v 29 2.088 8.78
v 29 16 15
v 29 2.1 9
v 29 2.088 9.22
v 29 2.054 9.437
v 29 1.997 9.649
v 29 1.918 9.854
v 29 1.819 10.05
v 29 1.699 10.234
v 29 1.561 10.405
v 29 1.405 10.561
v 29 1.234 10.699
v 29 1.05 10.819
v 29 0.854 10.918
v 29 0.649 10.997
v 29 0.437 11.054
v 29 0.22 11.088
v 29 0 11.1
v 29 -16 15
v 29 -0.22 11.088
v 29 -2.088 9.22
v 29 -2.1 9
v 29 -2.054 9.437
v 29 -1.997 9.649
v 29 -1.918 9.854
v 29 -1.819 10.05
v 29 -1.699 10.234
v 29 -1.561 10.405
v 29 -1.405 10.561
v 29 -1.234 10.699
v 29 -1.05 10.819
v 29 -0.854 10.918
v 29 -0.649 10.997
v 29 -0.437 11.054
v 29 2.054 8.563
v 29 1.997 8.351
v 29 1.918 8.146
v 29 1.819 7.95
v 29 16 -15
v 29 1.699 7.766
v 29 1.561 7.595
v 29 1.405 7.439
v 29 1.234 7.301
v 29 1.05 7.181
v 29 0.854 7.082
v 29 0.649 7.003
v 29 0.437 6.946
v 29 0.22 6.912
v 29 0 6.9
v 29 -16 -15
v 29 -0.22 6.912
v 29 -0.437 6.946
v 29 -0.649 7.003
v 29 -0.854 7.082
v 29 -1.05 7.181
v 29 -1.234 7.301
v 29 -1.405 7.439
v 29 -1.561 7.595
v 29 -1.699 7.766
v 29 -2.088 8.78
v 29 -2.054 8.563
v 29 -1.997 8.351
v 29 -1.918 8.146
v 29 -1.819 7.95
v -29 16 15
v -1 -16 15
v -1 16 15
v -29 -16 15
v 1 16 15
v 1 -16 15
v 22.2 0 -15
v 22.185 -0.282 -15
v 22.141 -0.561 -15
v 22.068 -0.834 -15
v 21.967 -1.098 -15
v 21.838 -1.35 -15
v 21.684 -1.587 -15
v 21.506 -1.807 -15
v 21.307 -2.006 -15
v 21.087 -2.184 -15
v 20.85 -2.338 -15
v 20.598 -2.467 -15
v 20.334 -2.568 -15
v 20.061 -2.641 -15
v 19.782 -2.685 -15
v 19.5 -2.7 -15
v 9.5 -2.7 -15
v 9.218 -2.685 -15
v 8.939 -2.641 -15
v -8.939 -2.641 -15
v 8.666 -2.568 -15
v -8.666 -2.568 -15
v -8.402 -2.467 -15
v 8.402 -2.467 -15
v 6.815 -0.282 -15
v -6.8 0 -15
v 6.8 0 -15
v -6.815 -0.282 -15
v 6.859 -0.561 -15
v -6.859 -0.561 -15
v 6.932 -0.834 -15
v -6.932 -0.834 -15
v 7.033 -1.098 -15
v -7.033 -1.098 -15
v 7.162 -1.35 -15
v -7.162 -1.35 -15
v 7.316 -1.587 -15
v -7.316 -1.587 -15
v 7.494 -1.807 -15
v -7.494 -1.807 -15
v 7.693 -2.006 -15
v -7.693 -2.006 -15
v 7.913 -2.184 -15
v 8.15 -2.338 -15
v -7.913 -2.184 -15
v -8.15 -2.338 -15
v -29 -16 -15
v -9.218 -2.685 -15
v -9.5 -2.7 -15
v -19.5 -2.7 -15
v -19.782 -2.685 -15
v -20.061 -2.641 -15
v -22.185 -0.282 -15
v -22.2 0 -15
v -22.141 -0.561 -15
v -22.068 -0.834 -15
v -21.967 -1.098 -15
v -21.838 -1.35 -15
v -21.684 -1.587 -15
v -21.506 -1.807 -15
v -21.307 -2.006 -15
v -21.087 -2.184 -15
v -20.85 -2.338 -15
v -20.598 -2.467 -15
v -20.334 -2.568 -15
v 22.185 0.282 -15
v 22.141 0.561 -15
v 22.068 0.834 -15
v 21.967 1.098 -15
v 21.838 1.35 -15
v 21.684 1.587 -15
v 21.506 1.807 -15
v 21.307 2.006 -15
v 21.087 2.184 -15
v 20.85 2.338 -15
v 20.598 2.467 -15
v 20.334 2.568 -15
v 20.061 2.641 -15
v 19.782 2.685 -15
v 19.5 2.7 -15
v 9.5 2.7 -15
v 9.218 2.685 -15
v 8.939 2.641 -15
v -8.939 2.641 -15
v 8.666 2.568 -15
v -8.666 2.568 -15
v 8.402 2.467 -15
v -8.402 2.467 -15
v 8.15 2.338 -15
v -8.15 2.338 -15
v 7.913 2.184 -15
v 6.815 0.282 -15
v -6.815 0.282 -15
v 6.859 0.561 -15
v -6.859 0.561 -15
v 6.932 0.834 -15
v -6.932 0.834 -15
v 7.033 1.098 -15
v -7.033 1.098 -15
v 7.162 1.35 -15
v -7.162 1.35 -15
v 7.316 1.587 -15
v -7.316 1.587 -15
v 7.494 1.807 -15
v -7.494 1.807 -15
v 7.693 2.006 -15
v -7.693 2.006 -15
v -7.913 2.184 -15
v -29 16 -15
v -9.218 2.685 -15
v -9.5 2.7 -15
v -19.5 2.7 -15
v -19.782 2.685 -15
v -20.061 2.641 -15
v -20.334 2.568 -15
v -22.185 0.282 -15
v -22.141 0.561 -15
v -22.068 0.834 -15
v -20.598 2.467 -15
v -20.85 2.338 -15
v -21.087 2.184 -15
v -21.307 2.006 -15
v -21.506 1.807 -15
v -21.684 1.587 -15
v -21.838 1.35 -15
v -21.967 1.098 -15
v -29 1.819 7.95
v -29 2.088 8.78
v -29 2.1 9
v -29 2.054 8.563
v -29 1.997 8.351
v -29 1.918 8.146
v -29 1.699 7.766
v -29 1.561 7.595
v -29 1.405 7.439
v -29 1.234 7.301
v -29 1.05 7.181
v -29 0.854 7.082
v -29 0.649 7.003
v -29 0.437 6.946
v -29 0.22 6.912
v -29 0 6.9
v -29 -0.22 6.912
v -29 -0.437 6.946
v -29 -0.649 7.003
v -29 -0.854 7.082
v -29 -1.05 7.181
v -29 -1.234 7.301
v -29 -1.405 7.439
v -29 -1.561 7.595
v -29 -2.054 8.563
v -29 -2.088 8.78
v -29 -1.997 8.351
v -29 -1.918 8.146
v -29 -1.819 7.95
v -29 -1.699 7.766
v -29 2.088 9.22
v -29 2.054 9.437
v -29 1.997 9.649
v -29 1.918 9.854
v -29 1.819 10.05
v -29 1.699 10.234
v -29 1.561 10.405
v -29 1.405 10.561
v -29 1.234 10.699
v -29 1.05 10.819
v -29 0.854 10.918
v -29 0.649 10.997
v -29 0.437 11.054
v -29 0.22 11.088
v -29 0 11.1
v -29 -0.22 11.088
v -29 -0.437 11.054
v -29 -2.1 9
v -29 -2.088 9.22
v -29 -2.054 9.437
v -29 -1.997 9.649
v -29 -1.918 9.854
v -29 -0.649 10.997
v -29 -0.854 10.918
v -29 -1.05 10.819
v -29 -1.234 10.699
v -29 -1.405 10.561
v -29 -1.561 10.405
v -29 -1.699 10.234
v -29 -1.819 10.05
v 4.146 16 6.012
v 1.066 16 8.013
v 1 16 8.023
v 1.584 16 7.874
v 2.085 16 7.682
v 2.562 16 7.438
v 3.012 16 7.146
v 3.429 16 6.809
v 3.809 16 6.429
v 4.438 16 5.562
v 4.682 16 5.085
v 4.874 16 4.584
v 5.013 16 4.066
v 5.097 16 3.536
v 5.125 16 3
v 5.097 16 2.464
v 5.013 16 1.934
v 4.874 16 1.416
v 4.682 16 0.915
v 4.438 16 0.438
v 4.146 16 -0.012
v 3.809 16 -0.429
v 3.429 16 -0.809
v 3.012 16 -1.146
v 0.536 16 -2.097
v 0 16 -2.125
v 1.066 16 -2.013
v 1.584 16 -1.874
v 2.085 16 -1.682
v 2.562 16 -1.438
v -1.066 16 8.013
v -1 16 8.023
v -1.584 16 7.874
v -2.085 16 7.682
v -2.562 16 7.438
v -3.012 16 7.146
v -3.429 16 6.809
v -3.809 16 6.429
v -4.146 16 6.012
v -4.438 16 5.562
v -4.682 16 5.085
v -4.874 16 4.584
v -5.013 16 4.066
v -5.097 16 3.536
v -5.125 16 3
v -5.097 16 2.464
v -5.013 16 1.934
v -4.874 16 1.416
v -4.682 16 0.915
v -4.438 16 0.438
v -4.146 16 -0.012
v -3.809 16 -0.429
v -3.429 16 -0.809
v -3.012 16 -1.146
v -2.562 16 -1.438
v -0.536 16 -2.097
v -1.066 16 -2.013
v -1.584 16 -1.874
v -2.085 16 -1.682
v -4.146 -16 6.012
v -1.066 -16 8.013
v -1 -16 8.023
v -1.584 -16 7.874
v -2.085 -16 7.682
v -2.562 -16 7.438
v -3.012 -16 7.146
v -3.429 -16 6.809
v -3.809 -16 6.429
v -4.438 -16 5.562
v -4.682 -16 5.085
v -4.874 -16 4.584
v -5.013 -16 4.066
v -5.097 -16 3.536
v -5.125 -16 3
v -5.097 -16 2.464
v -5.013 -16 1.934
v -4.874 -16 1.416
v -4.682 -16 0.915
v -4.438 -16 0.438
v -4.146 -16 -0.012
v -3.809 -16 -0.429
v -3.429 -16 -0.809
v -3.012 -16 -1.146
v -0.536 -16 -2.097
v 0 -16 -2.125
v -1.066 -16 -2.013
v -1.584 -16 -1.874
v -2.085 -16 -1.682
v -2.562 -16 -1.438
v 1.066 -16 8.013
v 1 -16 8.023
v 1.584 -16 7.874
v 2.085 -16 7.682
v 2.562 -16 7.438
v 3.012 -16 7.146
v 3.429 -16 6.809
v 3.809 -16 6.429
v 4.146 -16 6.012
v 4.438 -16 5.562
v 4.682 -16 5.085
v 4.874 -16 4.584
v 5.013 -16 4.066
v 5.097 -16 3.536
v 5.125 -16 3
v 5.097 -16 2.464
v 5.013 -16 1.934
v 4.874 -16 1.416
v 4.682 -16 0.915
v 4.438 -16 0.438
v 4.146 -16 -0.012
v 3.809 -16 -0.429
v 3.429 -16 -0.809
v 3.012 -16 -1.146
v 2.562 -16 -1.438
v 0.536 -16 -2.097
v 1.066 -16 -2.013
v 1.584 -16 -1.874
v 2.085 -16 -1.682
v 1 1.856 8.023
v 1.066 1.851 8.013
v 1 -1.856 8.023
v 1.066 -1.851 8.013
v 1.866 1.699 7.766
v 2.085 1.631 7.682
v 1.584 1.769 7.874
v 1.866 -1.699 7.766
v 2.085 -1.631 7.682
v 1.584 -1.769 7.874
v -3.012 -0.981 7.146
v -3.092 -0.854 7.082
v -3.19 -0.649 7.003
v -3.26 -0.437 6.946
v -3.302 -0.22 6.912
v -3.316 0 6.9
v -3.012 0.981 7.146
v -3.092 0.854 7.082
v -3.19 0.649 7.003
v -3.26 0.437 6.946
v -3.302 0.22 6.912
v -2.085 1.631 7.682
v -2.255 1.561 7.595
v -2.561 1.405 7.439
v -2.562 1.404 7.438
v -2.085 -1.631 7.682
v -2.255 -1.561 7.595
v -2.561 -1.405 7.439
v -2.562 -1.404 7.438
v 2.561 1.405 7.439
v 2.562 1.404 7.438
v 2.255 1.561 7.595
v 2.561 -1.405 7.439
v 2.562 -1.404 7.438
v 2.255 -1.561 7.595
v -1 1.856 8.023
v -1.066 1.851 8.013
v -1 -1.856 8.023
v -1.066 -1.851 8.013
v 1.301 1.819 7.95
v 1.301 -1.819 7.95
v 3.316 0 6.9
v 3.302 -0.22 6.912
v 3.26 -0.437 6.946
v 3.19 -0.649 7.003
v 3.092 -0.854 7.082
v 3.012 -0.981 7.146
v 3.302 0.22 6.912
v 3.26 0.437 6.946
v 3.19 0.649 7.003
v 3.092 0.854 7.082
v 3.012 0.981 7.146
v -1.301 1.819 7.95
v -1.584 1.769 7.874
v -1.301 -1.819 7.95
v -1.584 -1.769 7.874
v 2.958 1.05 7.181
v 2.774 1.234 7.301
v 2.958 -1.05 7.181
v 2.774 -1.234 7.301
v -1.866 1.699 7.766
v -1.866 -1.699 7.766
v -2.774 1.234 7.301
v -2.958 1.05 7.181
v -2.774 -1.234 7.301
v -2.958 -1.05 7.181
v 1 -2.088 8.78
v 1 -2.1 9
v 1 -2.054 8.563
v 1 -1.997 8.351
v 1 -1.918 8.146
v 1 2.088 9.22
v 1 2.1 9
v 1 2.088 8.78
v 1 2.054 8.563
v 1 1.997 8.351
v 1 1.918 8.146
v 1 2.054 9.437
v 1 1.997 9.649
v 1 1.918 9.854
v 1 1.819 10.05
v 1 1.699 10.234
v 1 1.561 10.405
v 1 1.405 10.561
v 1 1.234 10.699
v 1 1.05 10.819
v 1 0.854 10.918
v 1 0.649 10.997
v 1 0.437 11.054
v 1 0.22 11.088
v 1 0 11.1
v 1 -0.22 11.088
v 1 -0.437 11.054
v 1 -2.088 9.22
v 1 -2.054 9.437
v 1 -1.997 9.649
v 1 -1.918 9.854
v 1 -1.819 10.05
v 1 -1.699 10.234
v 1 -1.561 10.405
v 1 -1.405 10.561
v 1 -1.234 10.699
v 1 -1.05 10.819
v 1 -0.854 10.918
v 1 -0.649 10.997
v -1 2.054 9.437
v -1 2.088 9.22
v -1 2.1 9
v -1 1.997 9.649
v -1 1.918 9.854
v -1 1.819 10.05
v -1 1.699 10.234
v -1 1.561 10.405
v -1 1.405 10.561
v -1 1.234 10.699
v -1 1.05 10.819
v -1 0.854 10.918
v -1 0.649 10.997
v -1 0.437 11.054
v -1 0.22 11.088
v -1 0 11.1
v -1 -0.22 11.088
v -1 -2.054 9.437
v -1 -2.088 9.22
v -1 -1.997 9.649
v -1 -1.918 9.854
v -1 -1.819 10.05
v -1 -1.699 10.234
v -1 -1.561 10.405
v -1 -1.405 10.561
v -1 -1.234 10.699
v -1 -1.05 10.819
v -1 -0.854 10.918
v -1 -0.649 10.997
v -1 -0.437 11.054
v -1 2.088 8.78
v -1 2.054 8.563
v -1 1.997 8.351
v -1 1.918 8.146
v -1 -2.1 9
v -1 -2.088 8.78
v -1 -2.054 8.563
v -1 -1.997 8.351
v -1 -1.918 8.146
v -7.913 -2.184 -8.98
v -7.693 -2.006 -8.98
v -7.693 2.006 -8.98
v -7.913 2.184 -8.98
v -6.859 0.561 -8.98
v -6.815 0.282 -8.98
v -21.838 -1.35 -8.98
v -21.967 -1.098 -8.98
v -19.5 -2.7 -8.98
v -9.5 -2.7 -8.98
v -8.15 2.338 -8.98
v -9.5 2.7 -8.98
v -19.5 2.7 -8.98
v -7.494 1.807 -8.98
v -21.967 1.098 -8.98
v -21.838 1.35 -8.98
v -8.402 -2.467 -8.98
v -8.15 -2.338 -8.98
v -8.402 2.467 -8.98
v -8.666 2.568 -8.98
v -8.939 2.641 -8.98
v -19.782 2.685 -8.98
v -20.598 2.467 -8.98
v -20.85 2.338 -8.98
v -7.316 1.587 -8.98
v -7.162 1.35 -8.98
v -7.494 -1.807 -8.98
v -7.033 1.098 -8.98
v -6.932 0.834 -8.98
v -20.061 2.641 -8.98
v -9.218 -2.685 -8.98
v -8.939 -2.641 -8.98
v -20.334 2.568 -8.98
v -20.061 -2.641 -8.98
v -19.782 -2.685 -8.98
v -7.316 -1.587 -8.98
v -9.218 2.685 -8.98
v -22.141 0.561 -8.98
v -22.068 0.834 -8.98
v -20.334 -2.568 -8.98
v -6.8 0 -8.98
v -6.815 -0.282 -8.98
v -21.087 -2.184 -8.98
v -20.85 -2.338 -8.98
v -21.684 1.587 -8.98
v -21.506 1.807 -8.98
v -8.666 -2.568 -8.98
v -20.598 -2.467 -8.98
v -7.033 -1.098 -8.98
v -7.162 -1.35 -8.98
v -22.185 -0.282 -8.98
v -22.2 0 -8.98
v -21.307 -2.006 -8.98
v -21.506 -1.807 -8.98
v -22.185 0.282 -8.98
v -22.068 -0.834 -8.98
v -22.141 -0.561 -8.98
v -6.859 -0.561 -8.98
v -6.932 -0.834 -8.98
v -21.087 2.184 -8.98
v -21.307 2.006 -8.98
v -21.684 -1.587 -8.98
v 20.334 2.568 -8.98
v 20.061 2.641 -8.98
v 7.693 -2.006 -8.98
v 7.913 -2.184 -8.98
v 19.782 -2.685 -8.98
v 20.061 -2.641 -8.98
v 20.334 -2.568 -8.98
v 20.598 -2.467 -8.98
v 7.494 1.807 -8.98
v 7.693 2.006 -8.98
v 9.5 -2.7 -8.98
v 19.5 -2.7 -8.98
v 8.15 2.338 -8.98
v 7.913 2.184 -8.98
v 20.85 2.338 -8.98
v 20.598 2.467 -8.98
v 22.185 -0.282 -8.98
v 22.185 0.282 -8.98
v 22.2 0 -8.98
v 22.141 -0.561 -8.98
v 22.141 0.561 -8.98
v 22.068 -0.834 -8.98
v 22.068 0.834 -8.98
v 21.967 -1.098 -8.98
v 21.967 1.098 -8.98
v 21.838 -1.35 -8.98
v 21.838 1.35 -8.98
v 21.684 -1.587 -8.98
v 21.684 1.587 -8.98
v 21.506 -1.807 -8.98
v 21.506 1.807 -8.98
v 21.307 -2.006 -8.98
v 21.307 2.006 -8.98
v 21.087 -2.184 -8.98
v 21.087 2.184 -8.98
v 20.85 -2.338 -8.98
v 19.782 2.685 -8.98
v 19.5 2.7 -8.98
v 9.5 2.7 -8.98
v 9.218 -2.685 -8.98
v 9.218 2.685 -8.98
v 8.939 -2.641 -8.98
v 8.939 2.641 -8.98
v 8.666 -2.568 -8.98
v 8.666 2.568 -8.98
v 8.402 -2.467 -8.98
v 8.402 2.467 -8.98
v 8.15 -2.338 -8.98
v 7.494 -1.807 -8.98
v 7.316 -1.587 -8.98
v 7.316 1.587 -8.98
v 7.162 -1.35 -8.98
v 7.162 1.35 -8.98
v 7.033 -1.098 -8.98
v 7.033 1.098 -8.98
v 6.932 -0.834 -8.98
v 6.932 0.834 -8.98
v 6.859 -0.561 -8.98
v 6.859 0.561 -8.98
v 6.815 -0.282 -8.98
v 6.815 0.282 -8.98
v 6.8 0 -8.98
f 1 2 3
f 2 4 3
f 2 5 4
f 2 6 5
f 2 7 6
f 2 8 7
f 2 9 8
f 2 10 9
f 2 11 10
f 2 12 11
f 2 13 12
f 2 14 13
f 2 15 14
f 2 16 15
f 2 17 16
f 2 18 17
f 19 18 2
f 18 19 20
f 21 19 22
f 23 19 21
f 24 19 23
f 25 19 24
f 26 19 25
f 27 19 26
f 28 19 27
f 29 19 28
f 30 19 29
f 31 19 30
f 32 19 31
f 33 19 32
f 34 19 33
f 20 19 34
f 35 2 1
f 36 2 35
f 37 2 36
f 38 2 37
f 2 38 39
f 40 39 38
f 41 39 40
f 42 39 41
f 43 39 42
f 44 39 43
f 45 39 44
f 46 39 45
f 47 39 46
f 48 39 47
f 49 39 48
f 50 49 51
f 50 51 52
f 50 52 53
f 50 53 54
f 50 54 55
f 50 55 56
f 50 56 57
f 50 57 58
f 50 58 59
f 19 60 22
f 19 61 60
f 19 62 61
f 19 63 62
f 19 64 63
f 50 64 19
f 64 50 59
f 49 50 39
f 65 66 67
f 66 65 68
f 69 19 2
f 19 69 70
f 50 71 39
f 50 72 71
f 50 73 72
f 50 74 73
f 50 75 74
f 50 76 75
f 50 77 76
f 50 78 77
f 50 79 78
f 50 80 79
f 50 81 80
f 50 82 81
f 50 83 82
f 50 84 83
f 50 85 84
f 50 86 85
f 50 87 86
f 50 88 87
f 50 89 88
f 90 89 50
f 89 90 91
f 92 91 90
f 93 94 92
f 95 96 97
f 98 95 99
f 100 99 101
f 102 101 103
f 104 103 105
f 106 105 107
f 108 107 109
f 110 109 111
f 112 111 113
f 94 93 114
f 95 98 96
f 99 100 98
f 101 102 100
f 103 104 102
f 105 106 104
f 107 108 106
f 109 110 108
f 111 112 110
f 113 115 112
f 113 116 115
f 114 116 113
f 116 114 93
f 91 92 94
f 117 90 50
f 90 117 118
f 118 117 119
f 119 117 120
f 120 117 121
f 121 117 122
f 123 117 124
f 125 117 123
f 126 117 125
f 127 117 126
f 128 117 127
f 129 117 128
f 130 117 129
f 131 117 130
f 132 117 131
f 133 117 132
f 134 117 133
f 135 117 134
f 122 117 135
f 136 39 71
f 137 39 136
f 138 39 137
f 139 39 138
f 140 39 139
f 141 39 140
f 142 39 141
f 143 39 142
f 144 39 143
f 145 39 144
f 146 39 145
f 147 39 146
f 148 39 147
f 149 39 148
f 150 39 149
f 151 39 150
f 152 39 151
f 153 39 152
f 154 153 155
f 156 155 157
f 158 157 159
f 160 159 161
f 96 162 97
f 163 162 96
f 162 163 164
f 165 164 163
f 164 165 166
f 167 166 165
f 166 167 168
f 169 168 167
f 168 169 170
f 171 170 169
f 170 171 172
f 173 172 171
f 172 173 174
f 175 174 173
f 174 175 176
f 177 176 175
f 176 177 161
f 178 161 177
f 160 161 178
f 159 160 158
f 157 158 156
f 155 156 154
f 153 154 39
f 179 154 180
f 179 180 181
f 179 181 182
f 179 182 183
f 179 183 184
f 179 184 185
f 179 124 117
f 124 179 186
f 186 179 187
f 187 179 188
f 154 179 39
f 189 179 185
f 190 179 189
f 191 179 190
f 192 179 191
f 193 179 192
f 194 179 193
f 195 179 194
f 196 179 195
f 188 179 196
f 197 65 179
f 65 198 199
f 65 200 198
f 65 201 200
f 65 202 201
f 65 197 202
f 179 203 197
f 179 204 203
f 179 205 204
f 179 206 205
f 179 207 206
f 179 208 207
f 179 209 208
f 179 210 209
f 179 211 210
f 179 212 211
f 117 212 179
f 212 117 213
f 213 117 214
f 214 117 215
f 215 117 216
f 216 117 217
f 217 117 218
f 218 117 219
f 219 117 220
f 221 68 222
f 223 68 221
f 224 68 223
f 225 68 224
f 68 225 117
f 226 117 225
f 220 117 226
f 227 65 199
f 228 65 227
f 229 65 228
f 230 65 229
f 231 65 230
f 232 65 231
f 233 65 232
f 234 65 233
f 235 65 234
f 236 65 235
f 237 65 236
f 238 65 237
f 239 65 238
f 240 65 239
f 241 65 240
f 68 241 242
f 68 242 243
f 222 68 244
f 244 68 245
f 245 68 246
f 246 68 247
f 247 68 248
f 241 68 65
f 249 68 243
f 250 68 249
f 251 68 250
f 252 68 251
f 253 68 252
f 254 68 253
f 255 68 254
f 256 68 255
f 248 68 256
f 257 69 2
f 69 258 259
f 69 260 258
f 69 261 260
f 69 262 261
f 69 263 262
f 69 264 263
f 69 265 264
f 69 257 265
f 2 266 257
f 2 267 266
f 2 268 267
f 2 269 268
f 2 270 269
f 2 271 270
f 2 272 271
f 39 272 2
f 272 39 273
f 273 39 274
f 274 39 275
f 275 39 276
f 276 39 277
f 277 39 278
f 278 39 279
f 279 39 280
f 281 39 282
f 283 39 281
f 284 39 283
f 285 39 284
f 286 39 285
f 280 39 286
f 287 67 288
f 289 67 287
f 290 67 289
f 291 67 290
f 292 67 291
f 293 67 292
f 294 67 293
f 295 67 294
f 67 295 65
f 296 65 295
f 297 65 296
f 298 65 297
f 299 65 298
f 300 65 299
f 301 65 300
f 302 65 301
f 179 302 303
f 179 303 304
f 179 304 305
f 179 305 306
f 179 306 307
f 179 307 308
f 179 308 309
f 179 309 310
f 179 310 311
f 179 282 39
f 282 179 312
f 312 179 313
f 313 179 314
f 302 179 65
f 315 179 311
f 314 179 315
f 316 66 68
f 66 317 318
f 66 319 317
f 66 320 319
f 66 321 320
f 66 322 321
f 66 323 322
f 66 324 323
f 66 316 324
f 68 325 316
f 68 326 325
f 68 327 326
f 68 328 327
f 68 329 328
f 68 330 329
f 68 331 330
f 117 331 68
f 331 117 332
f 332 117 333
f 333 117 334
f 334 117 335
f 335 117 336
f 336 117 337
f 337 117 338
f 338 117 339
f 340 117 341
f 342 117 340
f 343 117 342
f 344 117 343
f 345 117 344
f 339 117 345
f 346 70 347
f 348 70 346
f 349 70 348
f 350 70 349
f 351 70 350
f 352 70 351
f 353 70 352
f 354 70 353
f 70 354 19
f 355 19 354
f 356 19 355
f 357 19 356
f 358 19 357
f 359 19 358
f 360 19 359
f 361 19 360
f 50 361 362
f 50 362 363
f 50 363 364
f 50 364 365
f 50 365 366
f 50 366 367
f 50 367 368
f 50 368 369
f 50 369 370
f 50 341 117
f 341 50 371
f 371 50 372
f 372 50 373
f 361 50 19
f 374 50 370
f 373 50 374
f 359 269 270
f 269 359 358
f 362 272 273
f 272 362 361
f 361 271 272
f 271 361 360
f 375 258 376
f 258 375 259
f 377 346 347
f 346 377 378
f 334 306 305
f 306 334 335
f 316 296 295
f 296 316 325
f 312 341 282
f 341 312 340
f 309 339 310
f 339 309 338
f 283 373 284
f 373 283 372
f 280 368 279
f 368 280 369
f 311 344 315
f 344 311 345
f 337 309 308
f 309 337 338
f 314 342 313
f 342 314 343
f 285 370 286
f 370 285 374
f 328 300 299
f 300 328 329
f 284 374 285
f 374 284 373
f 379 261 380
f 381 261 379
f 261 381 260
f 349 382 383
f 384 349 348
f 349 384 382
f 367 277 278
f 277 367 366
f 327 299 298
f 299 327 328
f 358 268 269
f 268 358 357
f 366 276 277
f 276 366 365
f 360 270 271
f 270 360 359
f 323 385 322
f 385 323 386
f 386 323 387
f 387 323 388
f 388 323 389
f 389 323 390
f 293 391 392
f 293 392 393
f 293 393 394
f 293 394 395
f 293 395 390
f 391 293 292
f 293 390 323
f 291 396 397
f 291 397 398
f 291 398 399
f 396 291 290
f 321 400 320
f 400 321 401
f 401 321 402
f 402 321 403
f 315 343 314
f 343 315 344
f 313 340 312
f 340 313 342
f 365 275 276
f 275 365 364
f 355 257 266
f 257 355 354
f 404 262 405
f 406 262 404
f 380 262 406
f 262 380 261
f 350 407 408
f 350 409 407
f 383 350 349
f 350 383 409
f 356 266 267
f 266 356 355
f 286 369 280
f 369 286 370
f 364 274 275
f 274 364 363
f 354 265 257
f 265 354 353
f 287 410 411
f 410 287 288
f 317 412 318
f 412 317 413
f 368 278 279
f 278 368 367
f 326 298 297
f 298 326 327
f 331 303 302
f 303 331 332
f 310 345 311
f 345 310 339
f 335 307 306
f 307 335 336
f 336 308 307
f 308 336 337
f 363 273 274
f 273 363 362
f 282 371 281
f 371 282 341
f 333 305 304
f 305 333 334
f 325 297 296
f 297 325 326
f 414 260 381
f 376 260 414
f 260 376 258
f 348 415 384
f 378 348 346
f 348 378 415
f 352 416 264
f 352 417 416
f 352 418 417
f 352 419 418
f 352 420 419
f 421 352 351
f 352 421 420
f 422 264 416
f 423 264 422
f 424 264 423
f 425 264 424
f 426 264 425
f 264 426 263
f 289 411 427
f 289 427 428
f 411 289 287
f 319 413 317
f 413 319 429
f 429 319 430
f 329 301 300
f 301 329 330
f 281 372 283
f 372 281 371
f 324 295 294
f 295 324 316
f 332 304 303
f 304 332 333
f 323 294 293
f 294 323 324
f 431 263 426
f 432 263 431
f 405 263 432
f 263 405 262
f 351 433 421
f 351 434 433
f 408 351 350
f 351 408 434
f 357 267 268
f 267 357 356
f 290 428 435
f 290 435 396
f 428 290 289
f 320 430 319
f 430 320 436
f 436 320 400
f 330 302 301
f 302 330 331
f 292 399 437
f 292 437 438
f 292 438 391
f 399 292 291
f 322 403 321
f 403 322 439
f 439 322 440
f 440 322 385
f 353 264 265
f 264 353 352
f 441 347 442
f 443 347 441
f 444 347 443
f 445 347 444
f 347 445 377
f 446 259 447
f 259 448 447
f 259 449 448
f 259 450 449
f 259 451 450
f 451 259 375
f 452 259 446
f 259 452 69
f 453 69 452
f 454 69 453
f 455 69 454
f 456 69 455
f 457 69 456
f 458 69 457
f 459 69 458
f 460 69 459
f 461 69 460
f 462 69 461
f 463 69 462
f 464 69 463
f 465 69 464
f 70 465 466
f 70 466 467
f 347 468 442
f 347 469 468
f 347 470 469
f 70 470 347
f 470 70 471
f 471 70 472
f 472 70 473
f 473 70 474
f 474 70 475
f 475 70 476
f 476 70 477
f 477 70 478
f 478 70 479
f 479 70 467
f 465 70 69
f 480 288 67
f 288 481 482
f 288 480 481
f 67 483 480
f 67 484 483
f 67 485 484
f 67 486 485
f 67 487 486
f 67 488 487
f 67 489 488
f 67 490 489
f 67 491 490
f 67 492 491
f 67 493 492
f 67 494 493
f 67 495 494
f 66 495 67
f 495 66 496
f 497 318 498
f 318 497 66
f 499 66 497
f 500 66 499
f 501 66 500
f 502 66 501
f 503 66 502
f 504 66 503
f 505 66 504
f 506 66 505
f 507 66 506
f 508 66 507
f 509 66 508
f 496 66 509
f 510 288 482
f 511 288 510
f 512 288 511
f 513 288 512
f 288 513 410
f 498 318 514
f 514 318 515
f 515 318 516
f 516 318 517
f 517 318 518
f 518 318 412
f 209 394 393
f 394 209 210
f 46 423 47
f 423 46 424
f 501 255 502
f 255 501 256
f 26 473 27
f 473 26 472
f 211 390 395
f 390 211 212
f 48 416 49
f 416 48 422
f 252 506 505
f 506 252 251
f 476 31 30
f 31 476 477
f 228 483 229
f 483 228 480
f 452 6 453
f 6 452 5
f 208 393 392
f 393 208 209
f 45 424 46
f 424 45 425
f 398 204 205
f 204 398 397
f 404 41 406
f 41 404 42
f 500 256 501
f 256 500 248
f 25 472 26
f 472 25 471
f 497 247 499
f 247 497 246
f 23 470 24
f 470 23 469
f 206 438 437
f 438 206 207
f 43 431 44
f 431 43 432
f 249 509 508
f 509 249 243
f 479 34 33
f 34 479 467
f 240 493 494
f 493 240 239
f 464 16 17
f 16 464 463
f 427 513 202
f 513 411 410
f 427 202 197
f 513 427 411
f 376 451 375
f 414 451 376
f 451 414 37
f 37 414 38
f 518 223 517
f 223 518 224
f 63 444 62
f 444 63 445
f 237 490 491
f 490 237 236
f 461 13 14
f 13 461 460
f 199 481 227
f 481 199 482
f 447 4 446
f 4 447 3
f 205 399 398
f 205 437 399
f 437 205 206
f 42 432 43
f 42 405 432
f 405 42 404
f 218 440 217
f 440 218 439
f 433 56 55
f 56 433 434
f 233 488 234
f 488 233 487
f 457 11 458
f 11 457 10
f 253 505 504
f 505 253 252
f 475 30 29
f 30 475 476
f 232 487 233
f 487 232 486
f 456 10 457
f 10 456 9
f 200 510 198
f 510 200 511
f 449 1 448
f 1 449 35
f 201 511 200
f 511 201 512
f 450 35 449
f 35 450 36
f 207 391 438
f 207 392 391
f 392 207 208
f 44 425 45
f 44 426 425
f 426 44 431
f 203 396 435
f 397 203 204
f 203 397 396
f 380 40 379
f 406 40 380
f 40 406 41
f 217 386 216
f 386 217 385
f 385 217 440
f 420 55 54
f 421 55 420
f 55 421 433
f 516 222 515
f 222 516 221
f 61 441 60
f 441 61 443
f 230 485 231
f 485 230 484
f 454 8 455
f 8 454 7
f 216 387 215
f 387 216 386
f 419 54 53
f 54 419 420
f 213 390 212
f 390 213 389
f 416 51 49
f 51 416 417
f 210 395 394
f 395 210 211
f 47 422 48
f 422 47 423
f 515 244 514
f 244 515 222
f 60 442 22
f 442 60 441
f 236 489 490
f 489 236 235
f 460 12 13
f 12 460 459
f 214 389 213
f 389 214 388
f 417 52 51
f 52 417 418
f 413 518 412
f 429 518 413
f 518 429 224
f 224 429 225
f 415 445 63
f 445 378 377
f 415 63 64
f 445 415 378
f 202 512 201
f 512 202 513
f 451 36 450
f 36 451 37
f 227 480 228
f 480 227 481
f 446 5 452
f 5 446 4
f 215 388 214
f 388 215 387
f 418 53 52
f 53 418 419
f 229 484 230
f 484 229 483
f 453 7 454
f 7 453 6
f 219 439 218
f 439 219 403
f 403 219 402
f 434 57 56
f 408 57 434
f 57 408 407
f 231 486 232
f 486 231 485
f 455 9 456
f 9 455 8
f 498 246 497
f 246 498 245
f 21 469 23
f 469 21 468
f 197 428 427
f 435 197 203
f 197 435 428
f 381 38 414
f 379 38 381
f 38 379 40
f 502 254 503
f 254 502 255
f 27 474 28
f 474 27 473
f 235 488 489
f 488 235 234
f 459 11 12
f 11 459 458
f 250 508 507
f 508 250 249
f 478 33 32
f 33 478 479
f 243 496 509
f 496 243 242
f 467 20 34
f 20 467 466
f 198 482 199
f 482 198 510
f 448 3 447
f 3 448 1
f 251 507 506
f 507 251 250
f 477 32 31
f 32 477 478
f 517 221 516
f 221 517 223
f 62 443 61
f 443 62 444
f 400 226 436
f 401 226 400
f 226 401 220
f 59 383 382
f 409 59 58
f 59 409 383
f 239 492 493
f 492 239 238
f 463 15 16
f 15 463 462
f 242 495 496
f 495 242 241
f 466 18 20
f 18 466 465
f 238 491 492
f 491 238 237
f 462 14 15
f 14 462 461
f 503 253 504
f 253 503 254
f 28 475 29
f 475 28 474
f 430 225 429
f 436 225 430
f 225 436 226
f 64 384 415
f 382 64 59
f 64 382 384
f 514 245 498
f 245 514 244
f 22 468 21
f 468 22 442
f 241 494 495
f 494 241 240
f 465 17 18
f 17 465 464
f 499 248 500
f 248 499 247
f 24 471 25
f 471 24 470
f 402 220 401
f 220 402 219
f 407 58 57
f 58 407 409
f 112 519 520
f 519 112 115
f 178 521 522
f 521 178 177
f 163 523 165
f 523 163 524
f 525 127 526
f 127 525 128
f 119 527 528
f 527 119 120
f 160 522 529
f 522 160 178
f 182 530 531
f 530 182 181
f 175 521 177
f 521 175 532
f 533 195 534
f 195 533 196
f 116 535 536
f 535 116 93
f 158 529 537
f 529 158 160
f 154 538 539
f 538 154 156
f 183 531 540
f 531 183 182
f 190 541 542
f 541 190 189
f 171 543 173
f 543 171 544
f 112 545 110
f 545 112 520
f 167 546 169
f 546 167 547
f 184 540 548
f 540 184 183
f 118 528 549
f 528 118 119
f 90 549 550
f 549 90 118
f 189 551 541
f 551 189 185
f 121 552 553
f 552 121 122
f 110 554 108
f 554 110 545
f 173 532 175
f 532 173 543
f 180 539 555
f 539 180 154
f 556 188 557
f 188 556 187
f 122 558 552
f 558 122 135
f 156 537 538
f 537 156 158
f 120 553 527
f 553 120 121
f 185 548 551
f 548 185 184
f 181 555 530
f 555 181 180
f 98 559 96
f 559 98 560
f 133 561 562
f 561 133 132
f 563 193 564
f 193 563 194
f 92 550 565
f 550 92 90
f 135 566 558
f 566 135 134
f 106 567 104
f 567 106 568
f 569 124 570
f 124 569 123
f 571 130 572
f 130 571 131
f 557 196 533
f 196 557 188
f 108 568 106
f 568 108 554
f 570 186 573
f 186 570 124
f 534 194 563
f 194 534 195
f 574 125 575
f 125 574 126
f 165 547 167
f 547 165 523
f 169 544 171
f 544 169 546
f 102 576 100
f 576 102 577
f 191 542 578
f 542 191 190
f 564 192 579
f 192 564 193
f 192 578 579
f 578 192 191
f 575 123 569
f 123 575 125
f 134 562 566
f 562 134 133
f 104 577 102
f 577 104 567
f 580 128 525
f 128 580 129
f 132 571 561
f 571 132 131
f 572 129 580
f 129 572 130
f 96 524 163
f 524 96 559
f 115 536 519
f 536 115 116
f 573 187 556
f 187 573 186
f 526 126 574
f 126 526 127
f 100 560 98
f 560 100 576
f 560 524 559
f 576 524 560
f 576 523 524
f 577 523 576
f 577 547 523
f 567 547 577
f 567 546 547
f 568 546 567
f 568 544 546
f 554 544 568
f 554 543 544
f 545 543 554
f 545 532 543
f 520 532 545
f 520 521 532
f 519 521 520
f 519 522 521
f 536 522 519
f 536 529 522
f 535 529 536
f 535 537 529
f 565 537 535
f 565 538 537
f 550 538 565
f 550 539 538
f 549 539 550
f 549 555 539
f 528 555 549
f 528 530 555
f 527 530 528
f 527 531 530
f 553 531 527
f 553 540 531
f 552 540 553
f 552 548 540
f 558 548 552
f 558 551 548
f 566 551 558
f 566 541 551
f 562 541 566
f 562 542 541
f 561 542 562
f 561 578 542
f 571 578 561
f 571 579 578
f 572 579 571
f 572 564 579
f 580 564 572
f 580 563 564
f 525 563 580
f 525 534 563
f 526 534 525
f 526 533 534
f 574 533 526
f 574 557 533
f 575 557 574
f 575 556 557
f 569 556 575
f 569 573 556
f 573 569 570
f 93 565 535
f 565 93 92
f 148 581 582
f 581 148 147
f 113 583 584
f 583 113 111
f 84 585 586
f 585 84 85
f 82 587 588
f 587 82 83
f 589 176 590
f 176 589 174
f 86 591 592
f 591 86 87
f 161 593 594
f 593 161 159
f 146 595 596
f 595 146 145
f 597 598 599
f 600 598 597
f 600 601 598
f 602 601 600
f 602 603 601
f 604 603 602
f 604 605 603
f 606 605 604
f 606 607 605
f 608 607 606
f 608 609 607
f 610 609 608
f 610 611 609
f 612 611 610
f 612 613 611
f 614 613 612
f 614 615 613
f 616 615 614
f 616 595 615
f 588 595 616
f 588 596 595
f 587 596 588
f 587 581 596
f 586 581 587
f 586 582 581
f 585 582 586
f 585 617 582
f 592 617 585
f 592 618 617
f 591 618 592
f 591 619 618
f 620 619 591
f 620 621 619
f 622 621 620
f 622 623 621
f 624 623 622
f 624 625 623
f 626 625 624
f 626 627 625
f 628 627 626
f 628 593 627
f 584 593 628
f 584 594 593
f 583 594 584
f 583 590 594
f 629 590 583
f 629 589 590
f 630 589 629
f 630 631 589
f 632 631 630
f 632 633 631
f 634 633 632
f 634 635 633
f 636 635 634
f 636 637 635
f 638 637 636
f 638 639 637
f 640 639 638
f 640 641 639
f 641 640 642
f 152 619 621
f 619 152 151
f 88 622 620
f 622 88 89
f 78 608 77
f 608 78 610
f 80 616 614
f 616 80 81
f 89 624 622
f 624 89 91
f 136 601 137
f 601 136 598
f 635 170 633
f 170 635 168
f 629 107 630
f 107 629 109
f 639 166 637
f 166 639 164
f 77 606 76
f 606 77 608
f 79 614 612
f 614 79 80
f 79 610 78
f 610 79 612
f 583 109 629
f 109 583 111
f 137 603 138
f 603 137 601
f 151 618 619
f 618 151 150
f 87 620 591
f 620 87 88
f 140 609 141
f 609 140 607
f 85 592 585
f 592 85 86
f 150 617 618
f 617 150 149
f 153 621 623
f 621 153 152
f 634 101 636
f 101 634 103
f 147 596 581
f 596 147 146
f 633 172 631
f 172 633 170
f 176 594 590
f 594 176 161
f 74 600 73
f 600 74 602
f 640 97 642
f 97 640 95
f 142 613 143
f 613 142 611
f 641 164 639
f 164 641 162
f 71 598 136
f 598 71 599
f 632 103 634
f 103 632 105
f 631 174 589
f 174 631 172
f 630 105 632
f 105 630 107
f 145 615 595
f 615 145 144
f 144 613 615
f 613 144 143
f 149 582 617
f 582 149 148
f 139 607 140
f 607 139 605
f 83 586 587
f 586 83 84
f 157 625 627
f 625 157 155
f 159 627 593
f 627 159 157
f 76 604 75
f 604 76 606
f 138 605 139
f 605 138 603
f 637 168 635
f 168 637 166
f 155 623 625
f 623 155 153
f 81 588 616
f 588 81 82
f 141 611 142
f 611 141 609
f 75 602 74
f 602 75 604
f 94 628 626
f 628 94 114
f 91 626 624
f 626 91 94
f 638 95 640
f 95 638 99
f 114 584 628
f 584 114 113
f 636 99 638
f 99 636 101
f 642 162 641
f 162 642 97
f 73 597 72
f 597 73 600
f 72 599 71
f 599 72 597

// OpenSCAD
// Clamp pedestal for 10 mm shaft.
$fn = 60;
eps = 0.02;
shaft_d = 10;
body_l = 58;
body_d = 32;
body_h = 30;
base_t = 6;
slot_w = 2;
mount_d = 5.4;
module mount_slot(x) {
    hull() {
        translate([x - 5, 0, -body_h / 2 - eps]) cylinder(d = mount_d, h = base_t + 2 * eps);
        translate([x + 5, 0, -body_h / 2 - eps]) cylinder(d = mount_d, h = base_t + 2 * eps);
    }
}
difference() {
    cube([body_l, body_d, body_h], center = true);
    translate([0, -body_d / 2 - eps, 3]) rotate([-90, 0, 0]) cylinder(d = shaft_d + 0.25, h = body_d + 2 * eps);
    translate([-slot_w / 2, -body_d / 2 - eps, 3]) cube([slot_w, body_d + 2 * eps, body_h / 2 + eps]);
    translate([-body_l / 2 - eps, 0, body_h / 2 - 6]) rotate([0, 90, 0]) cylinder(d = 4.2, h = body_l + 2 * eps);
    mount_slot(-body_l / 4);
    mount_slot(body_l / 4);
}
